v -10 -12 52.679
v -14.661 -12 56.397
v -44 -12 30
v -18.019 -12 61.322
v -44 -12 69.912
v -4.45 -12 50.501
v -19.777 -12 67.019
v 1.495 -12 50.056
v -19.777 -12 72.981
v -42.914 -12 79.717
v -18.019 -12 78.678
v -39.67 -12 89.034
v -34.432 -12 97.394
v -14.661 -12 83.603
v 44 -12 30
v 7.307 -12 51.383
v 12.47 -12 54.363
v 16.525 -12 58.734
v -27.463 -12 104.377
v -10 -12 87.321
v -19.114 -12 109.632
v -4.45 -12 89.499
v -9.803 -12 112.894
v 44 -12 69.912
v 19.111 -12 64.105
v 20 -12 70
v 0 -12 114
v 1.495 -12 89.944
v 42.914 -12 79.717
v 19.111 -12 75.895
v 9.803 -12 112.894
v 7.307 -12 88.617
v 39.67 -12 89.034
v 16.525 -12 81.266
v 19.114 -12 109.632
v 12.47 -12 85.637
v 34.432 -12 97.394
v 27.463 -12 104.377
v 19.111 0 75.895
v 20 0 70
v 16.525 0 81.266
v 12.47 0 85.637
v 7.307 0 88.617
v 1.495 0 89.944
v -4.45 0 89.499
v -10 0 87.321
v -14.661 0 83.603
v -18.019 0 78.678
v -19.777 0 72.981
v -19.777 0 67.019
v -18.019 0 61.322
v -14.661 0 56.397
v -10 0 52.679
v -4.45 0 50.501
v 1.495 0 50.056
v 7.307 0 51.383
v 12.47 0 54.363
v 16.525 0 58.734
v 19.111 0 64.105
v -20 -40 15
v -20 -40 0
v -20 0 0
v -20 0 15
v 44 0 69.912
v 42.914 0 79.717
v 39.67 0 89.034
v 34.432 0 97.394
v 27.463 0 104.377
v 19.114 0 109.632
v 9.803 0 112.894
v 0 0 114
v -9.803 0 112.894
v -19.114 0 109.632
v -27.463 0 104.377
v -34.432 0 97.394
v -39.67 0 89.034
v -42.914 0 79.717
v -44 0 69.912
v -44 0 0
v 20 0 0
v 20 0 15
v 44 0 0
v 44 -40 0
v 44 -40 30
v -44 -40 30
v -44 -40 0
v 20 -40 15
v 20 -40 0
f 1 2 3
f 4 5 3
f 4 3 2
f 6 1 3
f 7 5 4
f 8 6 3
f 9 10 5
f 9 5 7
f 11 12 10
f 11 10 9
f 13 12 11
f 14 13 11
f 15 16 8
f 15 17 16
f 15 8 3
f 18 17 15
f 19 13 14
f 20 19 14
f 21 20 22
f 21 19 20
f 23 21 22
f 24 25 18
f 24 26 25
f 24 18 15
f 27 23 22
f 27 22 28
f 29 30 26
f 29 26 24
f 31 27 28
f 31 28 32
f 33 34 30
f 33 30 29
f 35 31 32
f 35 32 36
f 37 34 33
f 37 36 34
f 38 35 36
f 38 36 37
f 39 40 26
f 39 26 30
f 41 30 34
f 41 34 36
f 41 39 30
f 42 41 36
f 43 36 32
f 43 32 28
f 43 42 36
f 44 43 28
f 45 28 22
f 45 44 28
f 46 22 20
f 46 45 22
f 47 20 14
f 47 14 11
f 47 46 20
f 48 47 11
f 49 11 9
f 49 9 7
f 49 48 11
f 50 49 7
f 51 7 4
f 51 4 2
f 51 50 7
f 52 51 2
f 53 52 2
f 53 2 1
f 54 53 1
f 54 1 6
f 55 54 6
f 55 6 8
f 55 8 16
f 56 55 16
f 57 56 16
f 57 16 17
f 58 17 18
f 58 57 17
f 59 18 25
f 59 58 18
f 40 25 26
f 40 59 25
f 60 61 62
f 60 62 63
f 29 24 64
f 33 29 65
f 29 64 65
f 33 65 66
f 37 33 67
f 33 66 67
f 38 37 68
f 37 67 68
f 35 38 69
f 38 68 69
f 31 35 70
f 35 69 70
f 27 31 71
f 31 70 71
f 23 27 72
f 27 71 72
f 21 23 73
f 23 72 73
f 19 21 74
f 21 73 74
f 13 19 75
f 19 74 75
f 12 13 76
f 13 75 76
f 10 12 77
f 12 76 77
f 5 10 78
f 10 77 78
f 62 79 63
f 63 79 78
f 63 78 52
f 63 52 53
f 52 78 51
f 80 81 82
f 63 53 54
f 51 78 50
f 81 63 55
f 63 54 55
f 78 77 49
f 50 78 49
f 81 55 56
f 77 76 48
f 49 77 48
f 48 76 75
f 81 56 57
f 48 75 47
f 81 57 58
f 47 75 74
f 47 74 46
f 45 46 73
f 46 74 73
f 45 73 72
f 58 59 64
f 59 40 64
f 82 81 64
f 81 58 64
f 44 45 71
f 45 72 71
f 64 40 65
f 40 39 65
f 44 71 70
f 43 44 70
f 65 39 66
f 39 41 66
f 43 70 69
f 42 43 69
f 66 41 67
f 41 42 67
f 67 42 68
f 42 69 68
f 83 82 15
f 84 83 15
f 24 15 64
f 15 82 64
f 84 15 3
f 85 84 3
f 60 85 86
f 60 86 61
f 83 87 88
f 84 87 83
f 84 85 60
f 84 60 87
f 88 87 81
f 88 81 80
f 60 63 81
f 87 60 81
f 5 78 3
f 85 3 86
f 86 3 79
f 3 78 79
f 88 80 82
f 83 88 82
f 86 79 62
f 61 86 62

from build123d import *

# Parameters (mm, degrees)
F0_R     = 20
F1_DEPTH = 12
F3_DEPTH = 40


# Not quite as in the source:
# - the program builds the solid bodies; features that only make, move or delete a surface that nothing else refers to are left out


with BuildPart() as f1:
    # F0 (on Front) → F1 (new body)
    with BuildSketch(Plane.XZ):
        with BuildLine():
            Line((-44, 69.9118748307), (-44, 30))
            Line((-44, 30), (44, 30))
            Line((44, 30), (44, 69.9118748307))
            ThreePointArc((44, 69.9118748307), (0, 114.0000882504), (-44, 69.9118748307))
        make_face()
        with Locations((0, 70)):
            Circle(F0_R, mode=Mode.SUBTRACT)
    extrude(amount=F1_DEPTH)

    # F0 (on Front) → F3 (join)
    with BuildSketch(Plane.XZ):
        Polygon((-44, 30), (-44, 0), (-20, 0), (-20, 15), (20, 15), (20, 0), (44, 0), (44, 30), align=None)
    extrude(amount=F3_DEPTH)


solid = f1.part
